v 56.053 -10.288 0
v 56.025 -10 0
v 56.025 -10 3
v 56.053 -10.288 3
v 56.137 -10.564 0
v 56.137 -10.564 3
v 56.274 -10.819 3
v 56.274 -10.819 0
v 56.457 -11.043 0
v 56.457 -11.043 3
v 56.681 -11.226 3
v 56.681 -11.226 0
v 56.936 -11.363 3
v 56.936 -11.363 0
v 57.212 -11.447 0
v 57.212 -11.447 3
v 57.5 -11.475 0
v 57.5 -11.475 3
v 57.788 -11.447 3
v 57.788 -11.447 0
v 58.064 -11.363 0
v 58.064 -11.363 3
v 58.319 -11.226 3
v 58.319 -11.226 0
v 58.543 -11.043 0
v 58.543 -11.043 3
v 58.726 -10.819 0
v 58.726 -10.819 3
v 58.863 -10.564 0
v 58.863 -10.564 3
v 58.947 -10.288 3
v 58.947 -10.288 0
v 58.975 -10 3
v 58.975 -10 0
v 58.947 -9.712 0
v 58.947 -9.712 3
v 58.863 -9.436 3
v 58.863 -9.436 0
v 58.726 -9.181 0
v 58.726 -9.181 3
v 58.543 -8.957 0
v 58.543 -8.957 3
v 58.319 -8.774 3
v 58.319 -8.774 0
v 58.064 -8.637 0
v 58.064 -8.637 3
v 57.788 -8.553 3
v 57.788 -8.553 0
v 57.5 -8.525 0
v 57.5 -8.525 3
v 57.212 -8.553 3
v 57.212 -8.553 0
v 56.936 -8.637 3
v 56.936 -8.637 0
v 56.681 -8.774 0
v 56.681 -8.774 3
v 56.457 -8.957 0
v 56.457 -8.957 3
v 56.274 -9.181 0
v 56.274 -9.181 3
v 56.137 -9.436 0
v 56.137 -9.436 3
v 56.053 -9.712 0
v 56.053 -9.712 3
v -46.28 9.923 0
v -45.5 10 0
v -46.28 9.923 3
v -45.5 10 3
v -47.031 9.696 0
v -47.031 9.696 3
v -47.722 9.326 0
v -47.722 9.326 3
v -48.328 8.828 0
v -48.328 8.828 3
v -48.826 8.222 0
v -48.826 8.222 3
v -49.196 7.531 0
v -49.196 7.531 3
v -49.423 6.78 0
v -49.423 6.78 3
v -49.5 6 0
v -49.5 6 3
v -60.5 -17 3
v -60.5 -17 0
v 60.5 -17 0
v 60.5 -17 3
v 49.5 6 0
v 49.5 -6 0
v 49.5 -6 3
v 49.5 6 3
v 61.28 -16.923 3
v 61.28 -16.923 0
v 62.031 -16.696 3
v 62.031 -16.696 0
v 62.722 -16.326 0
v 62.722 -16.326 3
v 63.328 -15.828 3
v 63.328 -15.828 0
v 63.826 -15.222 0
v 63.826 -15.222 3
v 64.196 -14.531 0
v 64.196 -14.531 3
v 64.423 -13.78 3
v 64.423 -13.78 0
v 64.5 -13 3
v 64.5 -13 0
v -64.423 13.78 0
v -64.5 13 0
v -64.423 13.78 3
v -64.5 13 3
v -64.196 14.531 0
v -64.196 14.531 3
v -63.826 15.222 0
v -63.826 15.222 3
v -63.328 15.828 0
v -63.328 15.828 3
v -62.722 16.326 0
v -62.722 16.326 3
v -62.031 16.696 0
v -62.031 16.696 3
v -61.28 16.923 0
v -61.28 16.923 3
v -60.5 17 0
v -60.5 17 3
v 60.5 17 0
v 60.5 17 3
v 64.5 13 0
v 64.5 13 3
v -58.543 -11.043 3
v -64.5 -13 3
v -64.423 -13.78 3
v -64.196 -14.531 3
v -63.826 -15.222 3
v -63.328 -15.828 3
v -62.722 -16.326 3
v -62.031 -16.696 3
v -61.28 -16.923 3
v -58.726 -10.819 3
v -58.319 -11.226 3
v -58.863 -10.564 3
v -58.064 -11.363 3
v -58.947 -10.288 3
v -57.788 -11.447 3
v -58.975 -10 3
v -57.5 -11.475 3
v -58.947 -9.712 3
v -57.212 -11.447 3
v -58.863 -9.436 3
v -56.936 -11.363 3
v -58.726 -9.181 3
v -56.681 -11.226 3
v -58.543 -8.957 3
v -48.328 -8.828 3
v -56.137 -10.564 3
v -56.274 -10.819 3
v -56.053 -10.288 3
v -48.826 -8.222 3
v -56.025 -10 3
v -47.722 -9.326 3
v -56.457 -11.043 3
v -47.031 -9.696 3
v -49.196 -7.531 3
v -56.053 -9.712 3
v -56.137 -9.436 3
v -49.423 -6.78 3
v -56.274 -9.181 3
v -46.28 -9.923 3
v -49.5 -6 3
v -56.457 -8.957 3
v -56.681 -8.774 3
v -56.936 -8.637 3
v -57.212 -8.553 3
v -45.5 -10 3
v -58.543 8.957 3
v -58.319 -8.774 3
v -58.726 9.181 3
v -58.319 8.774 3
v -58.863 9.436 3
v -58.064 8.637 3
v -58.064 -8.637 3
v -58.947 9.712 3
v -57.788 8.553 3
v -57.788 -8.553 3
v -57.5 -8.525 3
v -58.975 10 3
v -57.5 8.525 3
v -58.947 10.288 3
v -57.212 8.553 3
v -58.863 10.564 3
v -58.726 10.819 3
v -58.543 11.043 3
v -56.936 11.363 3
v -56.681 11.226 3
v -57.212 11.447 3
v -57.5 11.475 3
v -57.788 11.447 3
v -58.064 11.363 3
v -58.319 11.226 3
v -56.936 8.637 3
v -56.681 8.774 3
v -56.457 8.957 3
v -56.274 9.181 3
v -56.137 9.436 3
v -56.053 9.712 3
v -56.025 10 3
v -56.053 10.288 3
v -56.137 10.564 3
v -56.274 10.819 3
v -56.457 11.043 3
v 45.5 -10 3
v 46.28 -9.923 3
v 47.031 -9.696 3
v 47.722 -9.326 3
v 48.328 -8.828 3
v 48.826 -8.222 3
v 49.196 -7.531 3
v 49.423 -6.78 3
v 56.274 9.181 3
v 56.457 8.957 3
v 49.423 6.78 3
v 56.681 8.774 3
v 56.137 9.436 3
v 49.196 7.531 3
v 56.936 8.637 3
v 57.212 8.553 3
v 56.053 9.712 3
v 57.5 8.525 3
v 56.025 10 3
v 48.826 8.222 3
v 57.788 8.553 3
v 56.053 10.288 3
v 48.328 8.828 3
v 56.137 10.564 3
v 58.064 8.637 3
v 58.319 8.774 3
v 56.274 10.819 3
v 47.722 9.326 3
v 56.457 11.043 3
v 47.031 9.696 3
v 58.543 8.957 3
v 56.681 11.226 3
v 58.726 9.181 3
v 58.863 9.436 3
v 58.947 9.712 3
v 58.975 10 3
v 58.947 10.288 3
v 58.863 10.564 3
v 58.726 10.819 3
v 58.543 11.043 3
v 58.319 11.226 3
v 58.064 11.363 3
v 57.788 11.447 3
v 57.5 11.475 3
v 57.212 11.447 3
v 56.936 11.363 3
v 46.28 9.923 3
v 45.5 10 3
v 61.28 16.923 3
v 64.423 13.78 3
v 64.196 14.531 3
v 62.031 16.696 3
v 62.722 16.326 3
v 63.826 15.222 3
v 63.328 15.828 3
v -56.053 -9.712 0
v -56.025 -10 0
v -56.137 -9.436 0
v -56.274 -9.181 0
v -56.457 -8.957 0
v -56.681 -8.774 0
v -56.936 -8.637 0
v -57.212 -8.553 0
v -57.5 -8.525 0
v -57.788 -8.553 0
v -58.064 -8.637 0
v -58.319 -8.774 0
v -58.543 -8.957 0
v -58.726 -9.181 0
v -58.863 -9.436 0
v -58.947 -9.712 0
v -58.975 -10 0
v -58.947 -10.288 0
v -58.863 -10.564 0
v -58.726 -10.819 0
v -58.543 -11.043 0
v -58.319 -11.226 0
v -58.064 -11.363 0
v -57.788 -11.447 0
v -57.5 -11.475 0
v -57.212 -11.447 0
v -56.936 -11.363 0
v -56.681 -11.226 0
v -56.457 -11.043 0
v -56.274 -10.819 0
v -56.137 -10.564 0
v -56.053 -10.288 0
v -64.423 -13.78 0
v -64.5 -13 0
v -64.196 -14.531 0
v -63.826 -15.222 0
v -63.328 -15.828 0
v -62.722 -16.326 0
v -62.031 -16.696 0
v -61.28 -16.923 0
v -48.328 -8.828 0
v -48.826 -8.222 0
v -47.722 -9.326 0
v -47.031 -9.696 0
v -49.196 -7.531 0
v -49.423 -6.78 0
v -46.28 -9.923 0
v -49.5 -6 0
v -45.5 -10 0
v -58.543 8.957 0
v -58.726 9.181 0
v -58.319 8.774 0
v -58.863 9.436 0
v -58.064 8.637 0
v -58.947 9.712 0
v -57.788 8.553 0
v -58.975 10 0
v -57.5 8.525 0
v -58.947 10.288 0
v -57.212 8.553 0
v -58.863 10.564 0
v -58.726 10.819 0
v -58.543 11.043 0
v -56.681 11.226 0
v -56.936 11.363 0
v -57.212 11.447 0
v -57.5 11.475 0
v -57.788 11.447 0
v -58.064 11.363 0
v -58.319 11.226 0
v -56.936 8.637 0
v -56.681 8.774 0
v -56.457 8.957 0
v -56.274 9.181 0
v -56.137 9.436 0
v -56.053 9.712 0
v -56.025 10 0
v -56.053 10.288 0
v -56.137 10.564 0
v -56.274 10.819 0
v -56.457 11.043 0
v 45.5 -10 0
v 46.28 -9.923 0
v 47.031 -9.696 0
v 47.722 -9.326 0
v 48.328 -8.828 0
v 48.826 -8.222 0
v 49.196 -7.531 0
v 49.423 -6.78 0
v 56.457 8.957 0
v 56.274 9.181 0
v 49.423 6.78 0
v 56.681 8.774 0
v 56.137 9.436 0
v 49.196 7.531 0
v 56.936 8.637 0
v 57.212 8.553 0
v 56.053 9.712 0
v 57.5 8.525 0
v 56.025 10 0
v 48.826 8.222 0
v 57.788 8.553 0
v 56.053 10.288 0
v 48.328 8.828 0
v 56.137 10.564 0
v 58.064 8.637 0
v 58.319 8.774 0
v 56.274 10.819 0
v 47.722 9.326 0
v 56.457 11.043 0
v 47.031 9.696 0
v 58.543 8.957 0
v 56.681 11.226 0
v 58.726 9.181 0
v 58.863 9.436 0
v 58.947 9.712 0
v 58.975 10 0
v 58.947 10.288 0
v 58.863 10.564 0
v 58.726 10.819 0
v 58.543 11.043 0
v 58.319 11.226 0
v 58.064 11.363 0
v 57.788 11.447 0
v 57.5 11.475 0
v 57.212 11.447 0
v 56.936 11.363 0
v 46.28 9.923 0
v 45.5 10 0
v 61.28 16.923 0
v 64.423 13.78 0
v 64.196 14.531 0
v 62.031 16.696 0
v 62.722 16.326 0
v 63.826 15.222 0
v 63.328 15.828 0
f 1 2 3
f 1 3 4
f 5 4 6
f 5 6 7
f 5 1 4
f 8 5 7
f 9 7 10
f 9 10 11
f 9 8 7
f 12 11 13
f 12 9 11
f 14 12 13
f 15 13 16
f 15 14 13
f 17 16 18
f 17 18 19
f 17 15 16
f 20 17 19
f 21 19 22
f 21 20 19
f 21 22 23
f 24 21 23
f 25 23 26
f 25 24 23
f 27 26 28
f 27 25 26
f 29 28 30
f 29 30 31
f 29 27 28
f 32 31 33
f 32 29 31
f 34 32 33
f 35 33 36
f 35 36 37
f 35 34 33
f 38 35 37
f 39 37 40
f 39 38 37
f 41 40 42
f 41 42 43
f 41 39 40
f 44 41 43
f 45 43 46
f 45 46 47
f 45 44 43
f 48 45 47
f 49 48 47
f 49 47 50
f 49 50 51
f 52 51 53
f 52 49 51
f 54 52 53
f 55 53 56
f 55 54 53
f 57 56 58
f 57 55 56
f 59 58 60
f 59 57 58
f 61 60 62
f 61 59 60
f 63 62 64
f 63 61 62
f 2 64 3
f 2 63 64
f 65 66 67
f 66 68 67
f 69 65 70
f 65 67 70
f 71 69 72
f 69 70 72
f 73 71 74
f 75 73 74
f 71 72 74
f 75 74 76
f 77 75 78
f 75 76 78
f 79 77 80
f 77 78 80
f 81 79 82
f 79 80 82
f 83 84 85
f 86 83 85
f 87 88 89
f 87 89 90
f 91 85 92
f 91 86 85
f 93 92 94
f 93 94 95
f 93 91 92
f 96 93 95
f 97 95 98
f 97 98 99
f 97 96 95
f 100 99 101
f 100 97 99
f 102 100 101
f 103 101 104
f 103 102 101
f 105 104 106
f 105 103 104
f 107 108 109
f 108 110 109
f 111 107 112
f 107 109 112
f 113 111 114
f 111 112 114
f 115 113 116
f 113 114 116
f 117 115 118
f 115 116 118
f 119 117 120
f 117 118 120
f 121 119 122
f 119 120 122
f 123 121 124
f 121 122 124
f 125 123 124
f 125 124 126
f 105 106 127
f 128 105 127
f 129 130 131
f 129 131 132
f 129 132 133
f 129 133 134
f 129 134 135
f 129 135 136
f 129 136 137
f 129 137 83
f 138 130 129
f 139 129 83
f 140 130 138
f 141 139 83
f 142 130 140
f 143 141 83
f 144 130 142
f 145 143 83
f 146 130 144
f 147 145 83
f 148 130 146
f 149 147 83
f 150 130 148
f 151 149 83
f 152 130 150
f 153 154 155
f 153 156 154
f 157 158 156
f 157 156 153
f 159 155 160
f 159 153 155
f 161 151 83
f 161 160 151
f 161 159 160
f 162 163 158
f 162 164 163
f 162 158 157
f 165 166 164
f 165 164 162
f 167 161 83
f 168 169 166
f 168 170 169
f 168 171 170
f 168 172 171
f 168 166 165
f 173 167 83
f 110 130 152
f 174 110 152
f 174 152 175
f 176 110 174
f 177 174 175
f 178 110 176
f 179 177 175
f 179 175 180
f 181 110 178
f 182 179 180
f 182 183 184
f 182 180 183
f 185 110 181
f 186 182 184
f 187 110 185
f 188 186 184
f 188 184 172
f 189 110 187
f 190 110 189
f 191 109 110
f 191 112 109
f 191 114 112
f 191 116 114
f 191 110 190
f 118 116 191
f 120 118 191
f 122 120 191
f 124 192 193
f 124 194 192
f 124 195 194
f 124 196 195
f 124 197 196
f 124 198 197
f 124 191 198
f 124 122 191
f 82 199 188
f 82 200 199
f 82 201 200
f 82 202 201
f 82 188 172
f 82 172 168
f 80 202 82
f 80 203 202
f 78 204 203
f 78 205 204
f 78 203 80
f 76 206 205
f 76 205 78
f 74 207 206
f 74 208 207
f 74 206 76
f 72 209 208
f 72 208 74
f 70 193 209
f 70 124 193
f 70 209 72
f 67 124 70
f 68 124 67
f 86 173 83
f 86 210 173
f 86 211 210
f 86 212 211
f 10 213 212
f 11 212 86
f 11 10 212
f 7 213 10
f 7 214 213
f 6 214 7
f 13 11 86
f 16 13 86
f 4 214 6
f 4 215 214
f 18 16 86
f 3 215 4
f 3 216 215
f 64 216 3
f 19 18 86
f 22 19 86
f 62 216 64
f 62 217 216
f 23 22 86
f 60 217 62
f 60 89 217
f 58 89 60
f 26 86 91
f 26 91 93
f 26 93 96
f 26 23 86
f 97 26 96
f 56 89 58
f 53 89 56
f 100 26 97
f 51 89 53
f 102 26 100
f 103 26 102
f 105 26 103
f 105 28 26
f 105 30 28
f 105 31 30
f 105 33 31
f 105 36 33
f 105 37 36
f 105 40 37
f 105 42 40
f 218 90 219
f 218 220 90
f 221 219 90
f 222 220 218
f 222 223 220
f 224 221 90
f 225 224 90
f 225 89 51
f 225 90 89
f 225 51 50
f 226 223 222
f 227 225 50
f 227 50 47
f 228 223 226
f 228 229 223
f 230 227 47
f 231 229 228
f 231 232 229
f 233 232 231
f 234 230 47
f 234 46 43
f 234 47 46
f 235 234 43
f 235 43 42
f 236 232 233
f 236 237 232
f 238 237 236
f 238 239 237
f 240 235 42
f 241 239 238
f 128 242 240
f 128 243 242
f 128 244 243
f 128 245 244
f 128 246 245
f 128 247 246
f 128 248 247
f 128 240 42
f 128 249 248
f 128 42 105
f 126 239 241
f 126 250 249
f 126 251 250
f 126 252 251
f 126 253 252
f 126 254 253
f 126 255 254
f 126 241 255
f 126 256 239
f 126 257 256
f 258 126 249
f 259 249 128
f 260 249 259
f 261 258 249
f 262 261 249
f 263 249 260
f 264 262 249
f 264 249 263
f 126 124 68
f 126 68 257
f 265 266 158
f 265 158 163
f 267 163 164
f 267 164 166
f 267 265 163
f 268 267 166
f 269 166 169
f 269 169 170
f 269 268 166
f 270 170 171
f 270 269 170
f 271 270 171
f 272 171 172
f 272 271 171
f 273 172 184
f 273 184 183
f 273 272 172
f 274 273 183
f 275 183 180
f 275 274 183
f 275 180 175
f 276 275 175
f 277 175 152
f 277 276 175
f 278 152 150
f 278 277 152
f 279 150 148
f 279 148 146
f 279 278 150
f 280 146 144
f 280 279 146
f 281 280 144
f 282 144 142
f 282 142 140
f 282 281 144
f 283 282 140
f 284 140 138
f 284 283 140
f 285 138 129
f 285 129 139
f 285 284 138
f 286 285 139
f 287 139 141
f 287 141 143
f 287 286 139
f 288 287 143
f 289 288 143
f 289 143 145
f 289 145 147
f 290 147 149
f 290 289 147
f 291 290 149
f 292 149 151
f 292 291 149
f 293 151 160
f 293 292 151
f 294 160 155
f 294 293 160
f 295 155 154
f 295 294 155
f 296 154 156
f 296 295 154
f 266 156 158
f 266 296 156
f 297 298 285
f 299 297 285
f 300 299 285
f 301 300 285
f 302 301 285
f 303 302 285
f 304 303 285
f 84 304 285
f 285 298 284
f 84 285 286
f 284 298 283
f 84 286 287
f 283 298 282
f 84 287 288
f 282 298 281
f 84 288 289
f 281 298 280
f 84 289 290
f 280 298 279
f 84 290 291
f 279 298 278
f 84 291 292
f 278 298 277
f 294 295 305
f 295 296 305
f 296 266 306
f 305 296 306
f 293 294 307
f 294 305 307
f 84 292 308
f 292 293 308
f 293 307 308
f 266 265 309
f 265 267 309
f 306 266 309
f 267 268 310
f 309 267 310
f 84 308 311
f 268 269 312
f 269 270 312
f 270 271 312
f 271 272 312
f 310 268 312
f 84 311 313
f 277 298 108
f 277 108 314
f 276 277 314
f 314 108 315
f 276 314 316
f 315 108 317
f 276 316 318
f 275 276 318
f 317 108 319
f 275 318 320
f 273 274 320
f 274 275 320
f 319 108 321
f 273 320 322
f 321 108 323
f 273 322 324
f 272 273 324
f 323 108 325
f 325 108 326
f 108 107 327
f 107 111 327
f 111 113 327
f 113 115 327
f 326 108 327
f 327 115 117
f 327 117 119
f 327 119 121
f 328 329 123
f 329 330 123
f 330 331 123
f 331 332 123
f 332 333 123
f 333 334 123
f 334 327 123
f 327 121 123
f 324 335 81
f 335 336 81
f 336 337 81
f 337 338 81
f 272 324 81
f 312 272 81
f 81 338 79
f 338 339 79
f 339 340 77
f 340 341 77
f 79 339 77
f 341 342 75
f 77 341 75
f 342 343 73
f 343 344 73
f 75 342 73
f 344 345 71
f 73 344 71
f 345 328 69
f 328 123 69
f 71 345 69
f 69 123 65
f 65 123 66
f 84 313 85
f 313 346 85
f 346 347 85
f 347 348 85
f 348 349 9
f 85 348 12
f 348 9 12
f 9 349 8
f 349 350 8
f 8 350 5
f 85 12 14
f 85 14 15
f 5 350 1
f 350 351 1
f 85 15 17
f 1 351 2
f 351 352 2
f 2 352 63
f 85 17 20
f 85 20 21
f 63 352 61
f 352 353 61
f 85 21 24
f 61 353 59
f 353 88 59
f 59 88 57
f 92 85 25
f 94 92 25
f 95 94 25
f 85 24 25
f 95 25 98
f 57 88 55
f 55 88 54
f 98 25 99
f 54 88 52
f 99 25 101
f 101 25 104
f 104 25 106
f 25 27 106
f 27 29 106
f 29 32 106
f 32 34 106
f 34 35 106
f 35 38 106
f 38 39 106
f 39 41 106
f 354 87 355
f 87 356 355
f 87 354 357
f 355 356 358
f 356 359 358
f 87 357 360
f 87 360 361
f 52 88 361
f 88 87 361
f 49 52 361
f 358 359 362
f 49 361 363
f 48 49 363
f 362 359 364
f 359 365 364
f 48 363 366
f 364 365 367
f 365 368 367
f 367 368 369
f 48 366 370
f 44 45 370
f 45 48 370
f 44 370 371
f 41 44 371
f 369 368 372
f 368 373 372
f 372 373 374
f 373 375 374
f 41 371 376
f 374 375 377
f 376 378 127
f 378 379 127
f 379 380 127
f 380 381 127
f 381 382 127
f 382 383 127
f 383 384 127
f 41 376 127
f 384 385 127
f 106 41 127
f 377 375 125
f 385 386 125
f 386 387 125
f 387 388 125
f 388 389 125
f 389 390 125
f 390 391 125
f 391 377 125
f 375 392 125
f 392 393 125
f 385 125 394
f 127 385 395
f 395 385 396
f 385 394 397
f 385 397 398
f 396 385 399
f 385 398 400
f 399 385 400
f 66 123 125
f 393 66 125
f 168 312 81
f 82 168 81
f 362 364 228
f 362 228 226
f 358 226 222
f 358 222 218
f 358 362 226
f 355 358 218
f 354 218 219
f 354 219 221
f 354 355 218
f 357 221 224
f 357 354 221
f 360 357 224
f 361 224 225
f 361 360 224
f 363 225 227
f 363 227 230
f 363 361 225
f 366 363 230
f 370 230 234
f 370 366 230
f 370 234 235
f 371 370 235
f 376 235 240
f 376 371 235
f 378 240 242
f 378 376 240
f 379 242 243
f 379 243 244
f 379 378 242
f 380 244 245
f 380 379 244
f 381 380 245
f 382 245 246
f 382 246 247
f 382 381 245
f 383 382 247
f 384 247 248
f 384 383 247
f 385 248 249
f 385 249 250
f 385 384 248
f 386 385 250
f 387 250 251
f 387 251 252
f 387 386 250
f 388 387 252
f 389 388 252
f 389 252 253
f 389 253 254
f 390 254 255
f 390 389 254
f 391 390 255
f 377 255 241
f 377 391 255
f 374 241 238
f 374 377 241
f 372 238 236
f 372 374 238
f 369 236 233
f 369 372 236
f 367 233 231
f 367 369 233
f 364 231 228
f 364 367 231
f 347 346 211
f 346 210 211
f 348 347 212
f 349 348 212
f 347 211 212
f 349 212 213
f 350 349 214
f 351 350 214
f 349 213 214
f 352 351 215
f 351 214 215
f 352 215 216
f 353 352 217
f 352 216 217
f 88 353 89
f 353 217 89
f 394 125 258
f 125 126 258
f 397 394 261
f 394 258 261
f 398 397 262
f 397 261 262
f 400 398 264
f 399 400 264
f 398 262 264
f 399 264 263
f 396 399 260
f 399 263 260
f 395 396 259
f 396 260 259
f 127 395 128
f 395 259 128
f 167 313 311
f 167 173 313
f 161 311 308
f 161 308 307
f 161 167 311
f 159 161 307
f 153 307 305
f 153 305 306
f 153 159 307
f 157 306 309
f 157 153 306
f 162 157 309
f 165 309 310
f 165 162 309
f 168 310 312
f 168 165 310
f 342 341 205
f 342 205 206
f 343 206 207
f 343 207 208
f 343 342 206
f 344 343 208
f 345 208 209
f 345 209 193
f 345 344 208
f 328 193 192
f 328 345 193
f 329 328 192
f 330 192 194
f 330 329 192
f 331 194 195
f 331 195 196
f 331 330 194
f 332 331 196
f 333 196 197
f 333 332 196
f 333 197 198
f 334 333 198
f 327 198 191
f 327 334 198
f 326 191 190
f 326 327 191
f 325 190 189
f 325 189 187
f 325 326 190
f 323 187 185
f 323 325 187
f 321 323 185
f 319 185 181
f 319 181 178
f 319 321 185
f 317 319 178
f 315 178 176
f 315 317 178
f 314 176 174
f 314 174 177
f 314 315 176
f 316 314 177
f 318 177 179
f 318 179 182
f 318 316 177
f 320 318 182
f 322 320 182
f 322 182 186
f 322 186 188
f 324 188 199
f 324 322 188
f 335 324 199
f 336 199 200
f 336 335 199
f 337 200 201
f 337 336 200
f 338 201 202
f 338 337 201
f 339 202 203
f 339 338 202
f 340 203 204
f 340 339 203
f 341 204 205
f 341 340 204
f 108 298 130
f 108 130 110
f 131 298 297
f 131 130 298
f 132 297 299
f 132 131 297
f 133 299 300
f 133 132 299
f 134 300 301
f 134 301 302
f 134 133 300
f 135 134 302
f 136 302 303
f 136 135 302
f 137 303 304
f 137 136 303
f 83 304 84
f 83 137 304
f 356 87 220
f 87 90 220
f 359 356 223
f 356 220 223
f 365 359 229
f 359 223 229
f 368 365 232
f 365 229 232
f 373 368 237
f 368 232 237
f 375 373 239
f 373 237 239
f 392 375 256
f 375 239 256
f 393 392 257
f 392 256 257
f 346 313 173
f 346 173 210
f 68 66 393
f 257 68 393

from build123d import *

# Parameters (mm, degrees)
SKETCH_1_W      = 129
SKETCH_1_H      = 34
SKETCH_1_R      = 1.475
SKETCH_1_W_2    = 99
SKETCH_1_H_2    = 20
EXTRUDE_1_DEPTH = 3
FILLET_1_R      = 4


with BuildPart() as part:
    # 草图1 → 凸台-拉伸1 (new body)
    with BuildSketch(Plane.XY):
        Rectangle(SKETCH_1_W, SKETCH_1_H)
        with Locations((-57.5, 10)):
            Circle(SKETCH_1_R, mode=Mode.SUBTRACT)
        with Locations((-57.5, -10)):
            Circle(SKETCH_1_R, mode=Mode.SUBTRACT)
        with Locations(Location((57.5, -10, 0), (0, 0, 180))):
            Circle(SKETCH_1_R, mode=Mode.SUBTRACT)
        with Locations(Location((57.5, 10, 0), (0, 0, 180))):
            Circle(SKETCH_1_R, mode=Mode.SUBTRACT)
        Rectangle(SKETCH_1_W_2, SKETCH_1_H_2, mode=Mode.SUBTRACT)
    extrude(amount=EXTRUDE_1_DEPTH)

    # 圆角1
    fillet_1_edges = [part.edges().sort_by_distance(p)[0] for p in [
        (49.5, -10, 1.5),
        (49.5, 10, 1.5),
        (-49.5, 10, 1.5),
        (-49.5, -10, 1.5),
        (64.5, -17, 1.5),
        (-64.5, -17, 1.5),
        (-64.5, 17, 1.5),
        (64.5, 17, 1.5),
    ]]
    fillet(fillet_1_edges, radius=FILLET_1_R)


solid = part.part
